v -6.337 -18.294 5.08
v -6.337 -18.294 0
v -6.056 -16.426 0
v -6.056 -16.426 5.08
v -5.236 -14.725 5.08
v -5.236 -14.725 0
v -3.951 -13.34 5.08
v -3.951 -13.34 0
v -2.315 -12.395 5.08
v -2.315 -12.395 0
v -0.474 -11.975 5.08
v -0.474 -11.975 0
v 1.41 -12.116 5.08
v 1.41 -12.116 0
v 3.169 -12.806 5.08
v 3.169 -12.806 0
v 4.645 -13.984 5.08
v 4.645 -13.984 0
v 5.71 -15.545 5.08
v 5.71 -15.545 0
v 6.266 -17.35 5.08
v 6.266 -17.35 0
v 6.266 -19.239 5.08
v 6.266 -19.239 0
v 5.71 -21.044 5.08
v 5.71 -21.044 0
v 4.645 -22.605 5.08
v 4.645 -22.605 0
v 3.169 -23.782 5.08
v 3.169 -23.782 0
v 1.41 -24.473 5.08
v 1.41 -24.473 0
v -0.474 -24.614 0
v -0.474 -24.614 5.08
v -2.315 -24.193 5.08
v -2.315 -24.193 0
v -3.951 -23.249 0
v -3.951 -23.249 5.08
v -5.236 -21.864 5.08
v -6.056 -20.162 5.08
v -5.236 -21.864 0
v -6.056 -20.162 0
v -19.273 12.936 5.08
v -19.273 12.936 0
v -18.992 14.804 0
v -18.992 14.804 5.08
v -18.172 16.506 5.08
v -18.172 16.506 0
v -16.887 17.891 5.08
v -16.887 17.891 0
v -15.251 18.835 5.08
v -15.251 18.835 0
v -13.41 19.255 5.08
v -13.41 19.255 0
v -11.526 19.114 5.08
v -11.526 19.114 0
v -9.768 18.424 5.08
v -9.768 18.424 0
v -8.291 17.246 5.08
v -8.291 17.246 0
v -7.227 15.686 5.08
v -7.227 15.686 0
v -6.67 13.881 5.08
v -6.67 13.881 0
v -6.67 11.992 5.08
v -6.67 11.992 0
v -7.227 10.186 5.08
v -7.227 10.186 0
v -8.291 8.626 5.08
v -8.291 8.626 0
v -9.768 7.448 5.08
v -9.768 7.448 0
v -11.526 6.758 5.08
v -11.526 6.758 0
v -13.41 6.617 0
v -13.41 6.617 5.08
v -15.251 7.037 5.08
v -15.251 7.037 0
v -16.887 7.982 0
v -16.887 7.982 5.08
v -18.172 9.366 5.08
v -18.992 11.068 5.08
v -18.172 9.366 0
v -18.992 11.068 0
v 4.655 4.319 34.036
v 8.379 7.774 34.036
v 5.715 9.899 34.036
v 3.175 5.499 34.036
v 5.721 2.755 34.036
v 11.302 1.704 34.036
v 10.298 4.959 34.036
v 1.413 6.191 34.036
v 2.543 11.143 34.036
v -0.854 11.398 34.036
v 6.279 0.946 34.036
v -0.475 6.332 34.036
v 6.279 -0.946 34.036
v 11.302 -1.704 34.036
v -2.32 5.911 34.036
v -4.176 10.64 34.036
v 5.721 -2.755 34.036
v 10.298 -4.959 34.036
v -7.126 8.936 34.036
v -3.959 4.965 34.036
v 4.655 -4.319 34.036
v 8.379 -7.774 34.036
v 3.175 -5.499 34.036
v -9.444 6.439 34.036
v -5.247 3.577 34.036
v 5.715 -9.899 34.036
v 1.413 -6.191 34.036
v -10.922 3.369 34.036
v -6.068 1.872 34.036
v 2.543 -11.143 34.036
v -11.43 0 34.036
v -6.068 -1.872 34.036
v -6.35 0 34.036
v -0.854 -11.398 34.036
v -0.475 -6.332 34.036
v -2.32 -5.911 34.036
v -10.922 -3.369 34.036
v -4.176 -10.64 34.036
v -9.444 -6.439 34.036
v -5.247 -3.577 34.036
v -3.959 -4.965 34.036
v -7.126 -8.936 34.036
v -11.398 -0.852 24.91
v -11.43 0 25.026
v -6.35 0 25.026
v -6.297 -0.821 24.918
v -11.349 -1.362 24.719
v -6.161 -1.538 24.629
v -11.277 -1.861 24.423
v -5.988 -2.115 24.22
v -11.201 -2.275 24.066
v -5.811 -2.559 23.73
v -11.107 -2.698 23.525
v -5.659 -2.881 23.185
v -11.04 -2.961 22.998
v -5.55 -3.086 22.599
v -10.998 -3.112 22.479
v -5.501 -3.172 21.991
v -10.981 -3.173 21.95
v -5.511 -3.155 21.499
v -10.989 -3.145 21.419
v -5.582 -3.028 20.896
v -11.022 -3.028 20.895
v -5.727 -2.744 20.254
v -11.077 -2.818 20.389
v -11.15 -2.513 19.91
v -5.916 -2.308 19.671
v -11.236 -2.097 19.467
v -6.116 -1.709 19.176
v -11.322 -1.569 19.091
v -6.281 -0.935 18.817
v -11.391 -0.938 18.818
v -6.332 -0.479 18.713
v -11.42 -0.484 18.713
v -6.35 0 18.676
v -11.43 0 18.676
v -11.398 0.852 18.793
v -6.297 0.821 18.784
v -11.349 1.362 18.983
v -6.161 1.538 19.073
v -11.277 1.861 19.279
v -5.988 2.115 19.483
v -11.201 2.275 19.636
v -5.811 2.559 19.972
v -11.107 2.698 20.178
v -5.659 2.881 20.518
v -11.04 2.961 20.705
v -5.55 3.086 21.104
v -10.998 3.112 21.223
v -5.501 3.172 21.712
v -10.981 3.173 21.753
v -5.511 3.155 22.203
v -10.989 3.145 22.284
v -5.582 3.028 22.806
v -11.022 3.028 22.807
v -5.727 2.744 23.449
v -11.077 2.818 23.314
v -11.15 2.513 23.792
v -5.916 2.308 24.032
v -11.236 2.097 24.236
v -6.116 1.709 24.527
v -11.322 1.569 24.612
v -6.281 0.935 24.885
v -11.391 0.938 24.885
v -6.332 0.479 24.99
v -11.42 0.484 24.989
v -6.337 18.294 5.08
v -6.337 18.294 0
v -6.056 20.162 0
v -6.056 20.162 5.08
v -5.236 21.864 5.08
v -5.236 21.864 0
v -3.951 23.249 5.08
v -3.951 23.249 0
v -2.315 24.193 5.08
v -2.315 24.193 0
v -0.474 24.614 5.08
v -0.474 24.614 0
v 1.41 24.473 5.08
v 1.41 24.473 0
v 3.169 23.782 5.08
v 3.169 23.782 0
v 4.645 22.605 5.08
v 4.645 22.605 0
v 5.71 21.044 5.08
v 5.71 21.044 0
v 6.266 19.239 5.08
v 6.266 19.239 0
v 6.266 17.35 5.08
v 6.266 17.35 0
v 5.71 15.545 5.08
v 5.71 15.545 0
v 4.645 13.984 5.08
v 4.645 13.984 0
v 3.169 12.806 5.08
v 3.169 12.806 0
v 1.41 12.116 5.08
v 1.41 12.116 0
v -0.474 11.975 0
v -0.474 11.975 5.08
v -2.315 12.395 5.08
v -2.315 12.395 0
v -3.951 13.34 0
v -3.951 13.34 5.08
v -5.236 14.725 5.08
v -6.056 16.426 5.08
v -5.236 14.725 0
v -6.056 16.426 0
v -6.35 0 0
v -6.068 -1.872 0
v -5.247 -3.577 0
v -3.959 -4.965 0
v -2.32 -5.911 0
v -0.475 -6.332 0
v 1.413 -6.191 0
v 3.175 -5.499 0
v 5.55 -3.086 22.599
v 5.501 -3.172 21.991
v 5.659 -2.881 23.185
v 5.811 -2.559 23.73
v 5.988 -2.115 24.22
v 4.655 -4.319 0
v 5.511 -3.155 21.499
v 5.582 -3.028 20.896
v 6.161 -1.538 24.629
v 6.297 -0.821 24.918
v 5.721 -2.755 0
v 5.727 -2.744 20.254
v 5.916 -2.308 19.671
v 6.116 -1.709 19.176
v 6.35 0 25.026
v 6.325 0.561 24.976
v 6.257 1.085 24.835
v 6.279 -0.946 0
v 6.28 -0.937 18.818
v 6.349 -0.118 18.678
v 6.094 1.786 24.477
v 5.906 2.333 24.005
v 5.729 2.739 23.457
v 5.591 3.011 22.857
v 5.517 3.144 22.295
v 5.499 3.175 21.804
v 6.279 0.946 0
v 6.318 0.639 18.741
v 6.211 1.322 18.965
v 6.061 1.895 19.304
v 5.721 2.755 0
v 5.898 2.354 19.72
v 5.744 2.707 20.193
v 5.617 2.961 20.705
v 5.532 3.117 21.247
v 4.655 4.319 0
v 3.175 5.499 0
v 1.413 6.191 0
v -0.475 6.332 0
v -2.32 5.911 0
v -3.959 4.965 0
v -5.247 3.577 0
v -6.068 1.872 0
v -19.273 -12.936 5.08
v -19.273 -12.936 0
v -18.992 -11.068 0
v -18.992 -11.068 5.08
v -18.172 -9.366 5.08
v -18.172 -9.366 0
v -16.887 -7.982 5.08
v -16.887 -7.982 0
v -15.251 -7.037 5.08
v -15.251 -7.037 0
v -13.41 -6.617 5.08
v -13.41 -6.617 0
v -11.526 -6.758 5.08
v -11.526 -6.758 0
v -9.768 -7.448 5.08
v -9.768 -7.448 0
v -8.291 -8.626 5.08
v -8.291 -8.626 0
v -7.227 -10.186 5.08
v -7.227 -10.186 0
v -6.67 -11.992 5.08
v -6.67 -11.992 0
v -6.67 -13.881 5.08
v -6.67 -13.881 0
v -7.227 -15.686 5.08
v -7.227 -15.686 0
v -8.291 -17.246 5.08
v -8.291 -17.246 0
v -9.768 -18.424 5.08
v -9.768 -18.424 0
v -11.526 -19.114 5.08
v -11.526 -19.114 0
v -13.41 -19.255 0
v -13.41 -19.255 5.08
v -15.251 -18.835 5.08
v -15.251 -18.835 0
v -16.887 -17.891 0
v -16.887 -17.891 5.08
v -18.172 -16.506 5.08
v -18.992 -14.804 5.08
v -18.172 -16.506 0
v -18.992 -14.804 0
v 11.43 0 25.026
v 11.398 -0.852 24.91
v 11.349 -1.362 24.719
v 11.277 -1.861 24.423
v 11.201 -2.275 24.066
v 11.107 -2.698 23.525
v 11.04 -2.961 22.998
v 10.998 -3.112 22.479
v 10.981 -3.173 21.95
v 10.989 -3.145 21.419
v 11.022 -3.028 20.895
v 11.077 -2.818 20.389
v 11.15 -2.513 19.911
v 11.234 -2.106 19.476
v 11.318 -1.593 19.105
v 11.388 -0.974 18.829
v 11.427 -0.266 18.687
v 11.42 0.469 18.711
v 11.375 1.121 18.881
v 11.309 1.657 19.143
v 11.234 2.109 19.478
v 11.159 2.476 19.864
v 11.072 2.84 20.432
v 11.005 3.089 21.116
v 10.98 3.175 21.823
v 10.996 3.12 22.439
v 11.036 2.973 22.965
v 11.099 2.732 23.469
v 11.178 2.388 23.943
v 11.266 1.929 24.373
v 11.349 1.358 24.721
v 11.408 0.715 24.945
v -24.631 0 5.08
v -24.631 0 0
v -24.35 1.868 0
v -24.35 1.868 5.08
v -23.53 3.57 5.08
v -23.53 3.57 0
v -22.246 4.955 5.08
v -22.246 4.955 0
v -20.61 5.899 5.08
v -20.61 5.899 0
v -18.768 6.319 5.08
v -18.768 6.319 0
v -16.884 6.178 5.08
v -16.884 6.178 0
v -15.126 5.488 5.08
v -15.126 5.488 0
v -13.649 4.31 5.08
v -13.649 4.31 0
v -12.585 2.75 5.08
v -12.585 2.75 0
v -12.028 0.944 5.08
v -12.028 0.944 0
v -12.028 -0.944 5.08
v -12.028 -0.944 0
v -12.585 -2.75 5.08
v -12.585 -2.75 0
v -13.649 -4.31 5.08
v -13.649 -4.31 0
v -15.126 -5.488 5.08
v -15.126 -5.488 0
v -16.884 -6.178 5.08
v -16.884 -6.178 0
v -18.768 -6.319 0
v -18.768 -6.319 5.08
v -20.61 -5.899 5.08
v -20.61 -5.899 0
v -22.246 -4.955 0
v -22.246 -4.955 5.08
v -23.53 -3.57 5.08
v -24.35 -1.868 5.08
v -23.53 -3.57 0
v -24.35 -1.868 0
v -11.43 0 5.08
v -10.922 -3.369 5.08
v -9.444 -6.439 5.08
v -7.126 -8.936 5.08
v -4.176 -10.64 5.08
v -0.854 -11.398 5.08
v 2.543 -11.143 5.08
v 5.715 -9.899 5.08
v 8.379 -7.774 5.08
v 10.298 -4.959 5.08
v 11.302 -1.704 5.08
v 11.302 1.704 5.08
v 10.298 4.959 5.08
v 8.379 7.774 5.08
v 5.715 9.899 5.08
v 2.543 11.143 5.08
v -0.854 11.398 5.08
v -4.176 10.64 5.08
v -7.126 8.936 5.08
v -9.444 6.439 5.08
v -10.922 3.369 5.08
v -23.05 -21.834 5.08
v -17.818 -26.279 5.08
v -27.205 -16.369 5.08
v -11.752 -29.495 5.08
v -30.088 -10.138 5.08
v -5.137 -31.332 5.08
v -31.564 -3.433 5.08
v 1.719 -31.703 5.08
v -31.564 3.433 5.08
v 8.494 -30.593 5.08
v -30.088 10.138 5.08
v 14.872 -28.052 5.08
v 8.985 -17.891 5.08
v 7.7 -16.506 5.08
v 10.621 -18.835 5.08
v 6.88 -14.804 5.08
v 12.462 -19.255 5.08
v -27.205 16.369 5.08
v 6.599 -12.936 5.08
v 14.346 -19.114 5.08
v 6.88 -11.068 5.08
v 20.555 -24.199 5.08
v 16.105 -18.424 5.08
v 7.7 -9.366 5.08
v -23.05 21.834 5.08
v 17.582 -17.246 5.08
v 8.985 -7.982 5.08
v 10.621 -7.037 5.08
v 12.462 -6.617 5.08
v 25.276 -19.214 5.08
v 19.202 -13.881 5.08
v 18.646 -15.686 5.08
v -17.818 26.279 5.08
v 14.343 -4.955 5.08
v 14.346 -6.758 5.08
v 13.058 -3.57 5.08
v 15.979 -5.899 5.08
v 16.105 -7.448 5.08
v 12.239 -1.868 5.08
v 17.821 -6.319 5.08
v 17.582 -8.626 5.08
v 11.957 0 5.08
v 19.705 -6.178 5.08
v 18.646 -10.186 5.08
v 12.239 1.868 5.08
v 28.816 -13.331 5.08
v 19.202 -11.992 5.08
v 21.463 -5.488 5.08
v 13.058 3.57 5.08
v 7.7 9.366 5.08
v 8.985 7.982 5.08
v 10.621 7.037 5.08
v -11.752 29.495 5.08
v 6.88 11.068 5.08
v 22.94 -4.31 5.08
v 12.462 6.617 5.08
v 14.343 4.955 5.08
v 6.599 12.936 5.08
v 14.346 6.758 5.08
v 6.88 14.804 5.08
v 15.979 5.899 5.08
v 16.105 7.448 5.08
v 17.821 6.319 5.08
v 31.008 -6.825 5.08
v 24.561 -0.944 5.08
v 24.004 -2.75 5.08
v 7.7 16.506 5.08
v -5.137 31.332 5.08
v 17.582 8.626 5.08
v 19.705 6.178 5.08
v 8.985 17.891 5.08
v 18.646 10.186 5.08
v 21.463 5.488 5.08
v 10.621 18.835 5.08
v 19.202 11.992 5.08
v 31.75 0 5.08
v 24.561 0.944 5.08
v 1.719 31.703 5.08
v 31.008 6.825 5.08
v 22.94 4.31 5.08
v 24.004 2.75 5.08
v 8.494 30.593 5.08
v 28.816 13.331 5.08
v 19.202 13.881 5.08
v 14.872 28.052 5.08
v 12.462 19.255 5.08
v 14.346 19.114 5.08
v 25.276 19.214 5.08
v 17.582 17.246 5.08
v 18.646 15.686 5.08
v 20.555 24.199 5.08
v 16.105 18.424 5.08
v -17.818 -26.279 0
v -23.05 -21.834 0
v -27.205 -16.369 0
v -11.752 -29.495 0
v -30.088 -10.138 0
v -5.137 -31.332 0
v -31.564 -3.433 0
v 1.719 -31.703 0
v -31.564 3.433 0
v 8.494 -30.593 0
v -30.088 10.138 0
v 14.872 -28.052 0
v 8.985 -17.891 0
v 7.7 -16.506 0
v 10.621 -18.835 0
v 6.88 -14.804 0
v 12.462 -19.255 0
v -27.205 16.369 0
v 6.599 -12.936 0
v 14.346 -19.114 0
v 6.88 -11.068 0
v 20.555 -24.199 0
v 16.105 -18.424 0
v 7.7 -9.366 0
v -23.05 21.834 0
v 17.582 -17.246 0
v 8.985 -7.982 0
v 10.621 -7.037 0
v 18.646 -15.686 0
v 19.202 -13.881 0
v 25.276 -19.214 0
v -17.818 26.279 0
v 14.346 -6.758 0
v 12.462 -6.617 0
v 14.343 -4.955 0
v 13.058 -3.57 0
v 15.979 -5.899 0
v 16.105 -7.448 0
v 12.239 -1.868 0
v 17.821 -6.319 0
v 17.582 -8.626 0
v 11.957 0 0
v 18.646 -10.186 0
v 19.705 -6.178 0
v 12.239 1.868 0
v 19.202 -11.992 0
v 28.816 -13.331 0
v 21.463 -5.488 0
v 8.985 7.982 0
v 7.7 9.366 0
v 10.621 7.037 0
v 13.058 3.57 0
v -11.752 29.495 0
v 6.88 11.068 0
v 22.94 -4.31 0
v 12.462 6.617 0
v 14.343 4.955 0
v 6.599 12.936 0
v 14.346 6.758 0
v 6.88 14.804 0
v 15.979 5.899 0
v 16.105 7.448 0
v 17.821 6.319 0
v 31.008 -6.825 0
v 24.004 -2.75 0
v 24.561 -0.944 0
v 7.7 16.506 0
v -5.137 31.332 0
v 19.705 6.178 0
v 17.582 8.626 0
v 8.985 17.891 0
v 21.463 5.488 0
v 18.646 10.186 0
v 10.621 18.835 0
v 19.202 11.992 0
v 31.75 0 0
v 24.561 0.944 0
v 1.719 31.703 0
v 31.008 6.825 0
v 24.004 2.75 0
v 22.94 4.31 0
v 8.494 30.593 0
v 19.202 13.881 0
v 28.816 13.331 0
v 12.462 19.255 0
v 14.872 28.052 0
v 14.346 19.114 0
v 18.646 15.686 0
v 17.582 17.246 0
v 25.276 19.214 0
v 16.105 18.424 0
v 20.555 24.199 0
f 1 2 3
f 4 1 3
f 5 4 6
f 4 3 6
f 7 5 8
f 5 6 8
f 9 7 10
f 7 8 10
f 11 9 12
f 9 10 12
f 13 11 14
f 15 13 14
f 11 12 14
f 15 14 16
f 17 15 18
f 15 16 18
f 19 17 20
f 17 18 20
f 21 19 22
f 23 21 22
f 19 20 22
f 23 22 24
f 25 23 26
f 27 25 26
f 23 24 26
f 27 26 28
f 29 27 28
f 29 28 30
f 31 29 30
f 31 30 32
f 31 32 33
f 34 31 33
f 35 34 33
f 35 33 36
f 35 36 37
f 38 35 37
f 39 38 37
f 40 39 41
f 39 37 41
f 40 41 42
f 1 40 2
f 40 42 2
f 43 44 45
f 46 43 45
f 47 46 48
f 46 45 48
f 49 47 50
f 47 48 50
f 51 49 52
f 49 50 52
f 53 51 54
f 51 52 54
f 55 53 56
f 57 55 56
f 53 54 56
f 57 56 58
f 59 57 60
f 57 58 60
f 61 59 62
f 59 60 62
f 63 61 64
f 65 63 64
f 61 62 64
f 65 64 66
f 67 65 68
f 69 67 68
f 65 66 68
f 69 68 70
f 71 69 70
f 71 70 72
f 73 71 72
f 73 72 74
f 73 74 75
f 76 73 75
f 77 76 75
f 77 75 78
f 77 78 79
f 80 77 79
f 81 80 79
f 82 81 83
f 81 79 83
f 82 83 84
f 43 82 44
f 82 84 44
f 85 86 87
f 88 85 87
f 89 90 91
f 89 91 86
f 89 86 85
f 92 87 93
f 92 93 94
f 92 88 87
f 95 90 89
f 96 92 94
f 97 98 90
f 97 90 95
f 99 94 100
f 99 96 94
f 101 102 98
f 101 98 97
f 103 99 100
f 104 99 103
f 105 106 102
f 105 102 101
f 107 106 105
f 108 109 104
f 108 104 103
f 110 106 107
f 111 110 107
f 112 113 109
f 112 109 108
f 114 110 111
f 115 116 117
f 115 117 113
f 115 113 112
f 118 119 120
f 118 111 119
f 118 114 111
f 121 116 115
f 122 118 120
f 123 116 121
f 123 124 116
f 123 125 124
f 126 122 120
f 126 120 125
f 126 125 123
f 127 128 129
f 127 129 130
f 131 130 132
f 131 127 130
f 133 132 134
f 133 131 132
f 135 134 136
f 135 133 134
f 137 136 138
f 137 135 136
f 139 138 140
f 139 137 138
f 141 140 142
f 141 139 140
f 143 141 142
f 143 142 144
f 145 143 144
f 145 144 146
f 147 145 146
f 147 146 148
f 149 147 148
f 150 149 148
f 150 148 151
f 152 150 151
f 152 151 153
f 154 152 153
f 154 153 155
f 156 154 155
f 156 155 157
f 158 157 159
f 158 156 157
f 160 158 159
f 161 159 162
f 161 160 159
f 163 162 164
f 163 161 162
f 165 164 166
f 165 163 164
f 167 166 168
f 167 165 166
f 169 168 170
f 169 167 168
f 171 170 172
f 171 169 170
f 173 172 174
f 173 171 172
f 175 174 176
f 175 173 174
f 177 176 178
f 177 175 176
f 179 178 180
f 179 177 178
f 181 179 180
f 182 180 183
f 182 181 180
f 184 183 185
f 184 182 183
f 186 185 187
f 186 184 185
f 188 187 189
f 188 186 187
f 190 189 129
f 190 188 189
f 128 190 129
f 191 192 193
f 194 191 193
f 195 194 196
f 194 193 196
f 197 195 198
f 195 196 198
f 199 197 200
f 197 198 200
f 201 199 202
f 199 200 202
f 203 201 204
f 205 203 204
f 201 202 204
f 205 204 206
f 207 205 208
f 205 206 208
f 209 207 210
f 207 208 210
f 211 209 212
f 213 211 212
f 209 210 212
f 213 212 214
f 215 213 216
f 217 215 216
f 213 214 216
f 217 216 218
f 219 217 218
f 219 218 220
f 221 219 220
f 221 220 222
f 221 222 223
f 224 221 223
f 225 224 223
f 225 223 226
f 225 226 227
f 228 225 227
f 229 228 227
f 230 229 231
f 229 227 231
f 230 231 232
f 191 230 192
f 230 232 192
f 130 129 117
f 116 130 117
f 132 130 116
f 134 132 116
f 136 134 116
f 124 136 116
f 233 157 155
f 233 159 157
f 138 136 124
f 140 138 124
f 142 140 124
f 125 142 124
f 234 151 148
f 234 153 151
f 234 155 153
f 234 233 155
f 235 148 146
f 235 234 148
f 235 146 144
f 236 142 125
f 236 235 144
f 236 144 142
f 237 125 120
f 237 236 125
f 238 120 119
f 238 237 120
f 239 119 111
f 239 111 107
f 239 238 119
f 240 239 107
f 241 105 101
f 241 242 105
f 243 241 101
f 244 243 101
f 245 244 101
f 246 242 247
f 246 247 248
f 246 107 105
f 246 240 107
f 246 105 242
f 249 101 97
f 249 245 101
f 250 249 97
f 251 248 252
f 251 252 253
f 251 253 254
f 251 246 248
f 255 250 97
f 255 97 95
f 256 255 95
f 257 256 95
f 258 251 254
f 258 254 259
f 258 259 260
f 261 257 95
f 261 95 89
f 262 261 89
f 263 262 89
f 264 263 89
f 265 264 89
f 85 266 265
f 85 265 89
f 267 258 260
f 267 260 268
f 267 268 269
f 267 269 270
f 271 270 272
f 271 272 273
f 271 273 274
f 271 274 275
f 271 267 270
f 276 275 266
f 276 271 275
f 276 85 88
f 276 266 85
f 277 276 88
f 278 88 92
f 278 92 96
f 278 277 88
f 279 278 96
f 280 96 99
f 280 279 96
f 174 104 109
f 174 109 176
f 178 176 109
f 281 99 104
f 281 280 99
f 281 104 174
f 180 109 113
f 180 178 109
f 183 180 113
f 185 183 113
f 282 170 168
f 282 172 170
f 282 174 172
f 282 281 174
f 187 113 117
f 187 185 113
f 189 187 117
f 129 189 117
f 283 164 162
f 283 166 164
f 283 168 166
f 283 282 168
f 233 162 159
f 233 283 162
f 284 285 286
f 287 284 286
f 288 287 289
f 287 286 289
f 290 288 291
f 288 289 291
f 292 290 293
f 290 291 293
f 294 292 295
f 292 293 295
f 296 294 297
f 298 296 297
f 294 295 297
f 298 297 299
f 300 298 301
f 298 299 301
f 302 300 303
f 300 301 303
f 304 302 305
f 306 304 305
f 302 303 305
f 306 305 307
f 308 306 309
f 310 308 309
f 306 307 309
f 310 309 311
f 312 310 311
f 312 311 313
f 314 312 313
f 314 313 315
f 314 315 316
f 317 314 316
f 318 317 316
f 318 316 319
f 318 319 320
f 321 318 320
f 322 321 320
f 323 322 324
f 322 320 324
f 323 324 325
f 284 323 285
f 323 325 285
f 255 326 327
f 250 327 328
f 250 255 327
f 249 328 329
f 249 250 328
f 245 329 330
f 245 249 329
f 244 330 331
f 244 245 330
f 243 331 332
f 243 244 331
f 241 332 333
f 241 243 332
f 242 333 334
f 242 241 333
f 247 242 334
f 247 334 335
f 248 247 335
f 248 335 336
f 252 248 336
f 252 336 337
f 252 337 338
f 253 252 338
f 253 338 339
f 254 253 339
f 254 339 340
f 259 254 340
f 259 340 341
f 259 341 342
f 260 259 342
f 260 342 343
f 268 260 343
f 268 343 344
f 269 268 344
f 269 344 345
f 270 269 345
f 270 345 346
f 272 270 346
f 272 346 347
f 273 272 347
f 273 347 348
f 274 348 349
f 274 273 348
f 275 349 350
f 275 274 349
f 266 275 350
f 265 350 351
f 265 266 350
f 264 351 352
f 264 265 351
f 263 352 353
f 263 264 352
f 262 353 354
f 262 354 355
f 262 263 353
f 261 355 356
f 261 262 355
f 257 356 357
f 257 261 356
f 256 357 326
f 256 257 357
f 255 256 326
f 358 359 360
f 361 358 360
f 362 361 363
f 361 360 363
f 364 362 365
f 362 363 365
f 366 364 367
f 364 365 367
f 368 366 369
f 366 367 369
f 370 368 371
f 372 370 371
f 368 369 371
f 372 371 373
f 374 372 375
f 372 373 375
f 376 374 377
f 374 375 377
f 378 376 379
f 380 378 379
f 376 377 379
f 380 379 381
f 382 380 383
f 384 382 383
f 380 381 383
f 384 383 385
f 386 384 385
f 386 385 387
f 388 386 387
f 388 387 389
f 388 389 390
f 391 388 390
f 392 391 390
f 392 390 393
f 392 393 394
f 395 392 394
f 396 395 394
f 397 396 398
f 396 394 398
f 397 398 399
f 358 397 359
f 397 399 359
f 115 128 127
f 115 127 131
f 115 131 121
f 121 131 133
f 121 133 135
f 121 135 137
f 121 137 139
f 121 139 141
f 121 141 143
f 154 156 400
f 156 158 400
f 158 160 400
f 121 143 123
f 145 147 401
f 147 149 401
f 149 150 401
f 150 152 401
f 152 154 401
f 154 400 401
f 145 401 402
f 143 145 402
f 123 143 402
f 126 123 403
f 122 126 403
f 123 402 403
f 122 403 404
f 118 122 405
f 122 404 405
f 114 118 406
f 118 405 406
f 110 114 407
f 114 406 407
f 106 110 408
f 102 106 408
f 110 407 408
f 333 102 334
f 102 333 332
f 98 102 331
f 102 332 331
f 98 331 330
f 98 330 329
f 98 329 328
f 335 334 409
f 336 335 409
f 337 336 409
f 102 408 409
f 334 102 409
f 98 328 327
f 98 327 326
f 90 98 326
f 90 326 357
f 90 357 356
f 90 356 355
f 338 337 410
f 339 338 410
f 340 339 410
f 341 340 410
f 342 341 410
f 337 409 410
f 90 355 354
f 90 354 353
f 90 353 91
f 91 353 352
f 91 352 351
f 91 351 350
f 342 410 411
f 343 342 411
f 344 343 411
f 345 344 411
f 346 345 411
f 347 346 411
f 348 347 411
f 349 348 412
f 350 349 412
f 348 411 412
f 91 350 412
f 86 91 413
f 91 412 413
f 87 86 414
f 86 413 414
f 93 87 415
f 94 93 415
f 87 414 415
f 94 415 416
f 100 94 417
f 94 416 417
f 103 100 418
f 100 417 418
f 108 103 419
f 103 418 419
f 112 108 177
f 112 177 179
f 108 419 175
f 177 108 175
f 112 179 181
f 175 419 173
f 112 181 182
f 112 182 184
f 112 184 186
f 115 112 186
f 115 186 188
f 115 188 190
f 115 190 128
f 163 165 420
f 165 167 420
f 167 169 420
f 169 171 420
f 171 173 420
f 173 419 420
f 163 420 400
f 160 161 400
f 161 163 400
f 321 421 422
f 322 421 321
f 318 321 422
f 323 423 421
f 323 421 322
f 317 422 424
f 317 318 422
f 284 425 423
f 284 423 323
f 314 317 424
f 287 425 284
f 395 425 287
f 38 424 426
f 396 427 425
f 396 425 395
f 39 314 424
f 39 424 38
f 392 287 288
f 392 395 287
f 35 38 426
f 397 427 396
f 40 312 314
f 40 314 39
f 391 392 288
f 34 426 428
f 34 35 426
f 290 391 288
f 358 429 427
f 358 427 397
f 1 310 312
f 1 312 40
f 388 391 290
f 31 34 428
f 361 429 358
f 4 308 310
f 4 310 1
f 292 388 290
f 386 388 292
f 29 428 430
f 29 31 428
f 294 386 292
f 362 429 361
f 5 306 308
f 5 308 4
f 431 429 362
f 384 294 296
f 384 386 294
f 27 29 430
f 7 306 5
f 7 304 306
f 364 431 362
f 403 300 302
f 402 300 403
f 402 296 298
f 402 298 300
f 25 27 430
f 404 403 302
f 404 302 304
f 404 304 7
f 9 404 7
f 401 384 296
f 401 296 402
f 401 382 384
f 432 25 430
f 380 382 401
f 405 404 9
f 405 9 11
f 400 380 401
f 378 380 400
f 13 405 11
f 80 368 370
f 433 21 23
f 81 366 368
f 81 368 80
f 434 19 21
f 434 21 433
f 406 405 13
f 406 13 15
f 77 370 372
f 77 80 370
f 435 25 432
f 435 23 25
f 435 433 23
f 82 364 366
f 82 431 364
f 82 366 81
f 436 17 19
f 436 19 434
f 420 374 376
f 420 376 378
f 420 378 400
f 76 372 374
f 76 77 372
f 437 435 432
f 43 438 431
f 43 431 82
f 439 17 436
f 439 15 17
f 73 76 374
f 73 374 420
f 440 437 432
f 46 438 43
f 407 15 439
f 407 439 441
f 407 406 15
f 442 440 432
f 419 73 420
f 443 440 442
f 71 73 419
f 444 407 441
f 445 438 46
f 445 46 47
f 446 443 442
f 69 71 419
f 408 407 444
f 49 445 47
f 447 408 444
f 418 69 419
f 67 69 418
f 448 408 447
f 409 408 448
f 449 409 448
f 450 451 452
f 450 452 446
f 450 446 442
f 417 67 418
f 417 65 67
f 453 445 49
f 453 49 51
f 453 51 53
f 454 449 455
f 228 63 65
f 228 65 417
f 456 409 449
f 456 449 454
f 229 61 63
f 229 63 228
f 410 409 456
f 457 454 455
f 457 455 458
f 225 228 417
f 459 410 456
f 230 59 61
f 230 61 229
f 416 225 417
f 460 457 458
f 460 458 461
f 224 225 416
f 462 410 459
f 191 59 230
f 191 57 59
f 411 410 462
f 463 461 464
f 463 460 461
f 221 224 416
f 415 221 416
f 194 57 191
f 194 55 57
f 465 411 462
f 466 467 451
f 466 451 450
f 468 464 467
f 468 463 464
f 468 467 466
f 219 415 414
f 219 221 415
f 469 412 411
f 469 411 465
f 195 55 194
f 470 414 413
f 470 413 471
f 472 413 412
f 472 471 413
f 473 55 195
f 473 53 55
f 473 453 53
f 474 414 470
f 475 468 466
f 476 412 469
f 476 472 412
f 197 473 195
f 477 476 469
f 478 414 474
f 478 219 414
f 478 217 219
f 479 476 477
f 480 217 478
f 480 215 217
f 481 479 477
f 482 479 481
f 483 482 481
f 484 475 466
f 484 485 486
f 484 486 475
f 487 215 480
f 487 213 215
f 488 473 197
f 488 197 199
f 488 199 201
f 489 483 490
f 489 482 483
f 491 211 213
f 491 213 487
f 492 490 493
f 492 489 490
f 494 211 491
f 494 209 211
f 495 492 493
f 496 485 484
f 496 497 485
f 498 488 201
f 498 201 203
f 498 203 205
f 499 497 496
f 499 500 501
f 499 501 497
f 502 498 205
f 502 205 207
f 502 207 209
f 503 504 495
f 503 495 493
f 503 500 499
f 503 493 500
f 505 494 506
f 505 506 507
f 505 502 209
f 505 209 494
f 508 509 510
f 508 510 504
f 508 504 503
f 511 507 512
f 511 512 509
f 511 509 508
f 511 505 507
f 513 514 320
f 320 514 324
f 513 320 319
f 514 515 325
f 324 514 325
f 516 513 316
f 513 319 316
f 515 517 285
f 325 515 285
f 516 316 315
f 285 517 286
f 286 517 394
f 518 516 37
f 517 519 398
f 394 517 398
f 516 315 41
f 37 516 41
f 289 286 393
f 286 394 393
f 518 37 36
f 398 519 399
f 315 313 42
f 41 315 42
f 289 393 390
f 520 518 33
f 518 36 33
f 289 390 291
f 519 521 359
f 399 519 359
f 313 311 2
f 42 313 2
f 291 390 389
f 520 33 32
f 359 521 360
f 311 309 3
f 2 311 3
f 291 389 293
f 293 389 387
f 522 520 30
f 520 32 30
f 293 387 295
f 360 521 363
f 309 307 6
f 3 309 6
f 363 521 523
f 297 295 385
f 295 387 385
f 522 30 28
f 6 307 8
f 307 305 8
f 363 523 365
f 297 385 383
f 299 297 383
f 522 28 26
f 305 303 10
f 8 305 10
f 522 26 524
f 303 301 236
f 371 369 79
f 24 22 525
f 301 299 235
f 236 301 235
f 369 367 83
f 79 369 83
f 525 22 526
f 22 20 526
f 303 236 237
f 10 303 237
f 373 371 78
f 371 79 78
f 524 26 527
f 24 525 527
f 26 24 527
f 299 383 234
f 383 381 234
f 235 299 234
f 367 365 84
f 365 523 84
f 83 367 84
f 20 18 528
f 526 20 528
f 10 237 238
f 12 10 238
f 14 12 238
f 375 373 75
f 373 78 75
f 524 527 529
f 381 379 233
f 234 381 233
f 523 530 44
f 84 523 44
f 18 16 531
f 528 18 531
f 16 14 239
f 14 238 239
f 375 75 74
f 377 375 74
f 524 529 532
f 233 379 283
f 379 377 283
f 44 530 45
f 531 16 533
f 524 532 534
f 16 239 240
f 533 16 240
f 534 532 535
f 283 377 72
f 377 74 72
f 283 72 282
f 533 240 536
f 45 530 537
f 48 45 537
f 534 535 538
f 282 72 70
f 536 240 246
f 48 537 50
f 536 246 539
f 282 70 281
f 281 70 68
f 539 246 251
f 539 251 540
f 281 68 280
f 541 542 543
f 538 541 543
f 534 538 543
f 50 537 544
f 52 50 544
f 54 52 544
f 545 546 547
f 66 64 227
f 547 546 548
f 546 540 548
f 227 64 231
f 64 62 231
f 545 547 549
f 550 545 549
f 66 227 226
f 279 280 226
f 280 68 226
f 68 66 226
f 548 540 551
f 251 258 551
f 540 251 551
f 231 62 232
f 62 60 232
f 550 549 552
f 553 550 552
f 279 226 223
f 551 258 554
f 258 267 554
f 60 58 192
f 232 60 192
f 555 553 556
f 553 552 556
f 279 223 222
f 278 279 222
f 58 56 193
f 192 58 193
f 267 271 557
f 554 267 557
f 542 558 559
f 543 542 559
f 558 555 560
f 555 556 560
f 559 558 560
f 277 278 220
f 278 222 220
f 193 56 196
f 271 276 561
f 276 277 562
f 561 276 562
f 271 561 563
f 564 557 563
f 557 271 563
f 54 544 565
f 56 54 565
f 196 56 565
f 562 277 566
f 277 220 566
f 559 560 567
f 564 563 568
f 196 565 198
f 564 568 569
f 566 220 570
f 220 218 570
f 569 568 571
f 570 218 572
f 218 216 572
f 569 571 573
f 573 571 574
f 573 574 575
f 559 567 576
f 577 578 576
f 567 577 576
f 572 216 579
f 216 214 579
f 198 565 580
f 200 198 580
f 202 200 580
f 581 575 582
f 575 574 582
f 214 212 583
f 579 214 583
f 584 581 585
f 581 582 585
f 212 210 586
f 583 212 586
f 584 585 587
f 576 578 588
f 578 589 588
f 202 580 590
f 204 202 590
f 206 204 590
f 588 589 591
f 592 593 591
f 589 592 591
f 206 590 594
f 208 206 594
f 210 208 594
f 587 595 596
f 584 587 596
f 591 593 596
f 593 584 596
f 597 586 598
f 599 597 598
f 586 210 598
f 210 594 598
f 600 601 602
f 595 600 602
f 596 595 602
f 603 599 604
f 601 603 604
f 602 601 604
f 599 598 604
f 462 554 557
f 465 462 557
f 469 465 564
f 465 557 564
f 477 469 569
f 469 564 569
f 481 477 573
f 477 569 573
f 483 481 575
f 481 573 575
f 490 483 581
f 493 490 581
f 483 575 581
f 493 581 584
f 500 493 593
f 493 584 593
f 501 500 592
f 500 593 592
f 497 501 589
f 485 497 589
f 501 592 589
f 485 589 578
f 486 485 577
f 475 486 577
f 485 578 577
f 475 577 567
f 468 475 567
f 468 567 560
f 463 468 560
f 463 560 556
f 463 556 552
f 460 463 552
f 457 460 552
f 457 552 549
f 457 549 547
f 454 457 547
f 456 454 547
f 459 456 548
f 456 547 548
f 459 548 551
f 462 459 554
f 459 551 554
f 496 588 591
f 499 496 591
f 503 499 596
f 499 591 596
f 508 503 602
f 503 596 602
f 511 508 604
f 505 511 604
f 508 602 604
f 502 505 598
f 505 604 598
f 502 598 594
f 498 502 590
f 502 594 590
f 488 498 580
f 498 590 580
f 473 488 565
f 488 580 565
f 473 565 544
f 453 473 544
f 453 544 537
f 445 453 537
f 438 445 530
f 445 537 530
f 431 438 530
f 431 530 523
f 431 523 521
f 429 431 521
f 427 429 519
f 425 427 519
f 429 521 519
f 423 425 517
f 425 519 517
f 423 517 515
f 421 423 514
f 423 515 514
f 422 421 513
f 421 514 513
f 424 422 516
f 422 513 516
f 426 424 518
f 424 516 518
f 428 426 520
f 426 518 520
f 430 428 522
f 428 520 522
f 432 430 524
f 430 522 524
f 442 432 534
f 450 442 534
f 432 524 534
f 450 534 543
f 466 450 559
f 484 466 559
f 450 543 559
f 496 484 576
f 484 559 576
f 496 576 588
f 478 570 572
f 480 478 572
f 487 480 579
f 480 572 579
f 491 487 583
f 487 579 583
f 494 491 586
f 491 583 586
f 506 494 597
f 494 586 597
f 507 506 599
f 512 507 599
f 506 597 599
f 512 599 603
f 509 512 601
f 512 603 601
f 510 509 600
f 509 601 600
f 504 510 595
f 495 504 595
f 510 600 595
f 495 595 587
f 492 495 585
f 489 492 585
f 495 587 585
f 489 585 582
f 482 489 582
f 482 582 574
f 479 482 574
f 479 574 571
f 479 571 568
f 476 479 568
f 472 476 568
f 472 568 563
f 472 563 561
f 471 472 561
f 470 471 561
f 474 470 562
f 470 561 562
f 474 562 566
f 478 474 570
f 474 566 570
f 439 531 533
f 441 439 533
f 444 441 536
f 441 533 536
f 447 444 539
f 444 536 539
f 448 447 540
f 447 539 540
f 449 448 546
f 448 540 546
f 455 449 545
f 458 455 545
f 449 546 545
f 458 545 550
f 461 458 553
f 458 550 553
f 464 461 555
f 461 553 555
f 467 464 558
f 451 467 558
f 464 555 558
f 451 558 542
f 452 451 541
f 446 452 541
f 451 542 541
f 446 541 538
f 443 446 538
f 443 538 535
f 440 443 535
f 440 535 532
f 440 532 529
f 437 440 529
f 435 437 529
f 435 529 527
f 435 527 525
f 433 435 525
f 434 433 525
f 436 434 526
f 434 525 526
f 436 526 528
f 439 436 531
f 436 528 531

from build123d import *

# Parameters (mm, degrees)
SKETCH1_R               = 31.75
BOSS_EXTRUDE1_DEPTH     = 5.08
SKETCH2_R               = 6.35
CUT_EXTRUDE1_DEPTH      = 5.08
SKETCH3_R               = 11.43
BOSS_EXTRUDE2_DEPTH     = 28.956
CUT_EXTRUDE2_START      = -29.21
SKETCH5_R               = 6.35
CUT_EXTRUDE2_DEPTH      = 29.21
SKETCH6_R               = 6.337124867
CUT_EXTRUDE3_DEPTH      = 5.08
CUT_EXTRUDE4_DEPTH      = 17.526
CUT_EXTRUDE4_DEPTH_BACK = 11.938
SKETCH7_R               = 3.175


with BuildPart() as part:
    # Sketch1 → Boss-Extrude1 (new body)
    with BuildSketch(Plane.XY):
        Circle(SKETCH1_R)
    extrude(amount=BOSS_EXTRUDE1_DEPTH)

    # Sketch2 → Cut-Extrude1 (cut)
    with BuildSketch(Plane(origin=(0, 0, 0), x_dir=(-1, 0, 0), z_dir=(0, 0, -1))):
        Circle(SKETCH2_R)
    extrude(amount=-CUT_EXTRUDE1_DEPTH, mode=Mode.SUBTRACT)

    # Sketch3 → Boss-Extrude2 (add)
    with BuildSketch(Plane.XY.offset(5.08)):
        with Locations(Location((0, 0, 0), (0, 0, 180))):
            Circle(SKETCH3_R)
    extrude(amount=BOSS_EXTRUDE2_DEPTH)

    # Sketch5 → Cut-Extrude2 (cut)
    with BuildSketch(Plane.XY.offset(34.036).offset(CUT_EXTRUDE2_START)):
        with Locations(Location((0, 0, 0), (0, 0, 180))):
            Circle(SKETCH5_R)
    extrude(amount=CUT_EXTRUDE2_DEPTH, mode=Mode.SUBTRACT)

    # Sketch6 → Cut-Extrude3 (cut)
    with BuildSketch(Plane(origin=(0, 0, 0), x_dir=(-1, 0, 0), z_dir=(0, 0, -1))):
        with Locations((0, 18.294370769)):
            Circle(SKETCH6_R)
        with Locations((12.936073628, 12.936073628)):
            Circle(SKETCH6_R)
        with Locations((18.294370769, 0)):
            Circle(SKETCH6_R)
        with Locations((12.936073628, -12.936073628)):
            Circle(SKETCH6_R)
        with Locations((0, -18.294370769)):
            Circle(SKETCH6_R)
        with Locations((-12.936073628, -12.936073628)):
            Circle(SKETCH6_R)
        with Locations((-18.294370769, 0)):
            Circle(SKETCH6_R)
        with Locations((-12.936073628, 12.936073628)):
            Circle(SKETCH6_R)
    extrude(amount=-CUT_EXTRUDE3_DEPTH, mode=Mode.SUBTRACT)

    # Sketch7 → Cut-Extrude4 (cut, two sides: drawn at the far end of the back side and taken through both)
    with BuildSketch(Plane(origin=(0, 0, 0), x_dir=(0, 0, -1), z_dir=(1, 0, 0)).offset(-CUT_EXTRUDE4_DEPTH_BACK)):
        with Locations(Location((-21.851313678, 0, 0), (0, 0, 180))):
            Circle(SKETCH7_R)
    extrude(amount=CUT_EXTRUDE4_DEPTH + CUT_EXTRUDE4_DEPTH_BACK, mode=Mode.SUBTRACT)


solid = part.part
